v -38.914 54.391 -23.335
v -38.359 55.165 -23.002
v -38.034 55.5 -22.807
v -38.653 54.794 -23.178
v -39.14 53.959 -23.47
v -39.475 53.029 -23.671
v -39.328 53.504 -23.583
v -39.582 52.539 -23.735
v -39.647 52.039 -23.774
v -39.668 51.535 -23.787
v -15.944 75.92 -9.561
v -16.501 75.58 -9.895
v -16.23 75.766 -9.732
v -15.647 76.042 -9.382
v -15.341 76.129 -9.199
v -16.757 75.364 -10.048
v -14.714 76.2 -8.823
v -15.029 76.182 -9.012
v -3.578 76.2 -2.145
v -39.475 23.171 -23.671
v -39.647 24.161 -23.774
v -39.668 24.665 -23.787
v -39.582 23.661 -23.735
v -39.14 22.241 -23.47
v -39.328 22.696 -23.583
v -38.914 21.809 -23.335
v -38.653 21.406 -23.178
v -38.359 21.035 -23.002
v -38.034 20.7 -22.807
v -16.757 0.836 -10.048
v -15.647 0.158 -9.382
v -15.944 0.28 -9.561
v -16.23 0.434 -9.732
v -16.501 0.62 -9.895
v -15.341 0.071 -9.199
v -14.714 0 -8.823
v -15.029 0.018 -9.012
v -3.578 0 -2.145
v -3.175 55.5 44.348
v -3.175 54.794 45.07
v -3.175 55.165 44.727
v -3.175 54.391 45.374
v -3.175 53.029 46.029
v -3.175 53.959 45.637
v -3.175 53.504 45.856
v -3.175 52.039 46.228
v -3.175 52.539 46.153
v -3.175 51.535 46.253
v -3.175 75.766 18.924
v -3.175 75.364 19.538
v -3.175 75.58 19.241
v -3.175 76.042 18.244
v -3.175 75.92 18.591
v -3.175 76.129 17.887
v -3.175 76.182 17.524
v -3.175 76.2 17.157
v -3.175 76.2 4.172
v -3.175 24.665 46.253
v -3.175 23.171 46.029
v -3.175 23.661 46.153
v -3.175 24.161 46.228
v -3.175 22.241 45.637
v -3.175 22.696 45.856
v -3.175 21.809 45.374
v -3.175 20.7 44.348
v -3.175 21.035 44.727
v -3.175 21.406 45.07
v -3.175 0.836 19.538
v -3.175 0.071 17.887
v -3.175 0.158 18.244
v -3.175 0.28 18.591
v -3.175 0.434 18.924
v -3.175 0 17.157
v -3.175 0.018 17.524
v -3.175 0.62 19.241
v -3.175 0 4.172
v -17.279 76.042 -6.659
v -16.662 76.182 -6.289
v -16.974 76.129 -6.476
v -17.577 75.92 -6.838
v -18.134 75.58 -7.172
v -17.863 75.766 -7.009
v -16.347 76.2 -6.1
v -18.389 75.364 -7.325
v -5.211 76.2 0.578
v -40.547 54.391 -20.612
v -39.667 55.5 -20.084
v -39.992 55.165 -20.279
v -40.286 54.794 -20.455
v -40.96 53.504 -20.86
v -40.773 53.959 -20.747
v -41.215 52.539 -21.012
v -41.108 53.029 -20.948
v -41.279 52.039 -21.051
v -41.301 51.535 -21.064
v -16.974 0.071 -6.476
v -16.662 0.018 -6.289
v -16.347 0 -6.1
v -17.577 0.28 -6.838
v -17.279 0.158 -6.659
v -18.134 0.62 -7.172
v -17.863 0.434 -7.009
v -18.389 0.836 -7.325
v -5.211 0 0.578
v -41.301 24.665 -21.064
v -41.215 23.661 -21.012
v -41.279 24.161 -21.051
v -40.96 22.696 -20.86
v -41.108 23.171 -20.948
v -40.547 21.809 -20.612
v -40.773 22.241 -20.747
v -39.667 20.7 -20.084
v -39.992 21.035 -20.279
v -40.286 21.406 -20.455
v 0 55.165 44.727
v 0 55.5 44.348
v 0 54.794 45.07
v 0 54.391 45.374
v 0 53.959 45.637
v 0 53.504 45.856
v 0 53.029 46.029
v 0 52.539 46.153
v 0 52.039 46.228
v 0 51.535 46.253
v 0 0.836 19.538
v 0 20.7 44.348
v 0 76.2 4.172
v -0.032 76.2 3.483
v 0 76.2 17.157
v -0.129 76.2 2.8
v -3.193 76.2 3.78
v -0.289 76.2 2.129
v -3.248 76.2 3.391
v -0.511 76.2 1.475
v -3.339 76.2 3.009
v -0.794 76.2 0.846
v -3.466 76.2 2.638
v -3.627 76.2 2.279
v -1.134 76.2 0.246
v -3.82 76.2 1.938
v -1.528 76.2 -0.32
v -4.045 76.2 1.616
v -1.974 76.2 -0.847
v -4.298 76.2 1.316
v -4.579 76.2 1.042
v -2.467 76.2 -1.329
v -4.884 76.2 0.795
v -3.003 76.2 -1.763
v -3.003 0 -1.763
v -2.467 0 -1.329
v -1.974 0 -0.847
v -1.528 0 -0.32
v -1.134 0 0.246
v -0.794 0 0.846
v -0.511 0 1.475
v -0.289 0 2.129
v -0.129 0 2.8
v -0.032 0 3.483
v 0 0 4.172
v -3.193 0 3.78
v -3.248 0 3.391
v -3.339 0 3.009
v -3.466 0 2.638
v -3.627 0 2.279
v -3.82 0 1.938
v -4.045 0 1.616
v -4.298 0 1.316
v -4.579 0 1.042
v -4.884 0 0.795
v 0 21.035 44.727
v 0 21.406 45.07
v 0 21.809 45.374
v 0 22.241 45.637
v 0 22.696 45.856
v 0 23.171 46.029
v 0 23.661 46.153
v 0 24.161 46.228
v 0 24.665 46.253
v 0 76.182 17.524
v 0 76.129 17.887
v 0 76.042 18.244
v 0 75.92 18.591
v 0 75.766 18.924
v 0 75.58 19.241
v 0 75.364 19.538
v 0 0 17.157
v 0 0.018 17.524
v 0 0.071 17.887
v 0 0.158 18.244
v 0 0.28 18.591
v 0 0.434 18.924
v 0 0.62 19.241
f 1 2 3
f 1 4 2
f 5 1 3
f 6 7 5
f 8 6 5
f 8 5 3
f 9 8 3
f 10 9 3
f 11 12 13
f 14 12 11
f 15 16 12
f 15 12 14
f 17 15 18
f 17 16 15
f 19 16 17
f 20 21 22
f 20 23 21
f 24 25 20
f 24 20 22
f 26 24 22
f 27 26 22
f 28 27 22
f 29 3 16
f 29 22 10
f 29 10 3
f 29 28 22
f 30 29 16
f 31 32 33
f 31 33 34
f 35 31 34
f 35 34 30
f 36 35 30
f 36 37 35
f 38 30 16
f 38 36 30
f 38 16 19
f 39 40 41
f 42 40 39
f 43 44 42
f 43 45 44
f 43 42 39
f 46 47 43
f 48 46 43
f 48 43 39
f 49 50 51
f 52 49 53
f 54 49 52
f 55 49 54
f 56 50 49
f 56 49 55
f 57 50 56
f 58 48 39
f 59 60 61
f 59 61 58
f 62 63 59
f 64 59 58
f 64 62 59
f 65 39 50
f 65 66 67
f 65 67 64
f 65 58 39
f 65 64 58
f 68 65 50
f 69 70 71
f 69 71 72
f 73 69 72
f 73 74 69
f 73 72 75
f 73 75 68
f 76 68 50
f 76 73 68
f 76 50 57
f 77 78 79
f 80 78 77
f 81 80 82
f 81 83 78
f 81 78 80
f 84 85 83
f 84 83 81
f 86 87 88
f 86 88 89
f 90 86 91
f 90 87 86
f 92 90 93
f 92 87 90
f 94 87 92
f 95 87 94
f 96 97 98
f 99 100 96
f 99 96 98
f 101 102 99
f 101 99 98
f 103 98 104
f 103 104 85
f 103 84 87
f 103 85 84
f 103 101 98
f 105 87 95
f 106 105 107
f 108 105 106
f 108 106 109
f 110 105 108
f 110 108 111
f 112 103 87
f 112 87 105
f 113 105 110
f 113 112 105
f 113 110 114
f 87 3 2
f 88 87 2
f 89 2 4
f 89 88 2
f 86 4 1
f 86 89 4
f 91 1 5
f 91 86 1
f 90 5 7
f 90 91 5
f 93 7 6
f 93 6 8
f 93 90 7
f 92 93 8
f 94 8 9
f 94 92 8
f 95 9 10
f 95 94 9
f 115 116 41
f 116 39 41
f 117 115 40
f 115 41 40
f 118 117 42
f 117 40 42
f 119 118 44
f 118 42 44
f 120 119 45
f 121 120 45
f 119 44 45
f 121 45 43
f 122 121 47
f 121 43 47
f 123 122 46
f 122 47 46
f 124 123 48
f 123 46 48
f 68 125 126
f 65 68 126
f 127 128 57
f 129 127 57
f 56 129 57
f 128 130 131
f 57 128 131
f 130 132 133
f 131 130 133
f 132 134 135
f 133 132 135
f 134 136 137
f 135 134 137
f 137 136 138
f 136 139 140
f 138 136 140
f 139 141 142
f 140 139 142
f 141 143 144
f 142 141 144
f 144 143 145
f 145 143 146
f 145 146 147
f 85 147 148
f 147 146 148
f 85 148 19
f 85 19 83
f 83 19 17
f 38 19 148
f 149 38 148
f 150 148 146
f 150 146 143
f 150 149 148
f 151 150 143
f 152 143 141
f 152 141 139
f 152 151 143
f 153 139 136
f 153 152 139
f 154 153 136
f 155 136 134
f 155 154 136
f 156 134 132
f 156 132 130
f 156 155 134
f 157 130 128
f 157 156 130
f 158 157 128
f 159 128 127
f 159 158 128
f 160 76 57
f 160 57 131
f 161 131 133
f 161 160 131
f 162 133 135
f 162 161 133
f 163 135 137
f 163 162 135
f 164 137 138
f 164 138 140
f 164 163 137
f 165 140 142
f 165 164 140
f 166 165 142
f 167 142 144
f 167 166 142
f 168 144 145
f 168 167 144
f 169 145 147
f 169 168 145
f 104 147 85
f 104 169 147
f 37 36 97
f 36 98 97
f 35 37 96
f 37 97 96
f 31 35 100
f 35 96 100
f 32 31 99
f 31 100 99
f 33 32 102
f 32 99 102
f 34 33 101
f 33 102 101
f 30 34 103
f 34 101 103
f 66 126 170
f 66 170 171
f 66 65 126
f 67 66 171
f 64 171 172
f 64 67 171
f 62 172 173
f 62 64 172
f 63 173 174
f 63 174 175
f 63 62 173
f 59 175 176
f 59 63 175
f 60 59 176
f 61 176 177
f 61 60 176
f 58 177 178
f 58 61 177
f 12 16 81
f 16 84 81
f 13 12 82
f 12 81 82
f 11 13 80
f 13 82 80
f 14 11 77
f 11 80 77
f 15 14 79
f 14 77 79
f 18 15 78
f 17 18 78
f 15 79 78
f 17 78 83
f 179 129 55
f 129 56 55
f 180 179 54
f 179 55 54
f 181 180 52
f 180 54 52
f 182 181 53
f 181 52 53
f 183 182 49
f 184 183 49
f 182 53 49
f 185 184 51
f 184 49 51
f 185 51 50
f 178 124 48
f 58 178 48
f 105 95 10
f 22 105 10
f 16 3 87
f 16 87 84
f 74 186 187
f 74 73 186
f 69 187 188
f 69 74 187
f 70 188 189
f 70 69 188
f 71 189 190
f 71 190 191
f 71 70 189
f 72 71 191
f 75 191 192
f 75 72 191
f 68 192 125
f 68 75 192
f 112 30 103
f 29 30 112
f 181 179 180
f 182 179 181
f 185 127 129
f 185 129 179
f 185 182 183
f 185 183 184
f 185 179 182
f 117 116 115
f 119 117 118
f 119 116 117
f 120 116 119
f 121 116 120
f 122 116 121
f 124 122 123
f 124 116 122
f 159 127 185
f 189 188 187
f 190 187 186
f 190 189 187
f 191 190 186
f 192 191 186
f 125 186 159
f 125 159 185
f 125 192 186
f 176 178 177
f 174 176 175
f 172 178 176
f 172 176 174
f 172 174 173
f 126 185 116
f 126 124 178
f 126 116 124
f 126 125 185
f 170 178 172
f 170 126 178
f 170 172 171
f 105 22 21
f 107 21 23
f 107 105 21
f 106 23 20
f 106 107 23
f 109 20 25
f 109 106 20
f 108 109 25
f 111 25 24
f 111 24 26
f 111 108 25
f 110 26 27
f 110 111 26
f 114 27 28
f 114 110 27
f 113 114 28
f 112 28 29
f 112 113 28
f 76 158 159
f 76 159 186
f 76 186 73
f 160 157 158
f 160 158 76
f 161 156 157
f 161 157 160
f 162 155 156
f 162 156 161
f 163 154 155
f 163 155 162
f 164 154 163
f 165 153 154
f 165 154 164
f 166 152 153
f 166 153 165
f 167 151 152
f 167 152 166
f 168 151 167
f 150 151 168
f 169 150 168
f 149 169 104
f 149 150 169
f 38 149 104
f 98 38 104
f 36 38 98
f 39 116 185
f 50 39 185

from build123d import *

# Parameters (mm, degrees)
BOSS_EXTRUDE2_DEPTH = 76.2
CUT_EXTRUDE3_REACH  = 43.301
CUT_EXTRUDE4_REACH  = 62.908
FILLET1_R           = 5.08
FILLET2_R           = 3.81


with BuildPart() as part:
    # Sketch1 → Boss-Extrude2 (new body)
    with BuildSketch(Plane(origin=(0, 0, 0), x_dir=(1, 0, 0), z_dir=(0, 1, 0))):
        with BuildLine():
            Line((-39.668156778, 23.786852448), (-3.577868638, 2.145454699))
            ThreePointArc((-3.577868638, 2.145454699), (-0.956579917, -0.541770779), (0, -4.171824524))
            Line((0, -4.171824524), (0, -46.2534))
            Line((0, -46.2534), (-3.175, -46.2534))
            Line((-3.175, -46.2534), (-3.175, -4.171824524))
            ThreePointArc((-3.175, -4.171824524), (-3.719260987, -2.106449117), (-5.21068388, -0.577510483))
            Line((-5.21068388, -0.577510483), (-41.300972021, 21.063887265))
            Line((-41.300972021, 21.063887265), (-39.668156778, 23.786852448))
        make_face()
    extrude(amount=BOSS_EXTRUDE2_DEPTH)

    # Sketch2 → Cut-Extrude3 (cut, up to next)
    with BuildSketch(Plane(origin=(0, 0, 0), x_dir=(0, 0, -1), z_dir=(1, 0, 0)), mode=Mode.PRIVATE) as cut_extrude3_sk1:
        Polygon((-46.2534, 53.975), (-18.494383897, 76.2), (-46.2534, 76.2), align=None)
    cut_extrude3_tool1 = extrude(cut_extrude3_sk1.sketch, amount=-CUT_EXTRUDE3_REACH, mode=Mode.PRIVATE) & part.part
    add(cut_extrude3_tool1.solids().sort_by_distance((0, 68.791667, 37.000395))[0], mode=Mode.SUBTRACT)
    # Sketch2 → Cut-Extrude3 (cut, up to next)
    with BuildSketch(Plane(origin=(0, 0, 0), x_dir=(0, 0, -1), z_dir=(1, 0, 0)), mode=Mode.PRIVATE) as cut_extrude3_sk2:
        Polygon((-46.2534, 22.225), (-46.2534, 0), (-18.494383897, 0), align=None)
    cut_extrude3_tool2 = extrude(cut_extrude3_sk2.sketch, amount=-CUT_EXTRUDE3_REACH, mode=Mode.PRIVATE) & part.part
    add(cut_extrude3_tool2.solids().sort_by_distance((0, 7.408333, 37.000395))[0], mode=Mode.SUBTRACT)

    # Sketch4 → Cut-Extrude4 (cut, up to next)
    with BuildSketch(Plane(origin=(0, 0, 0), x_dir=(-0.857626829, 0, -0.514272517), z_dir=(0.514272517, 0, -0.857626829)), mode=Mode.PRIVATE) as cut_extrude4_sk1:
        Polygon((46.2534, 53.975), (18.494383897, 76.2), (46.2534, 76.2), align=None)
    cut_extrude4_tool1 = extrude(cut_extrude4_sk1.sketch, amount=-CUT_EXTRUDE4_REACH, mode=Mode.PRIVATE) & part.part
    add(cut_extrude4_tool1.solids().sort_by_distance((-31.732531, 68.791667, -19.028286))[0], mode=Mode.SUBTRACT)
    # Sketch4 → Cut-Extrude4 (cut, up to next)
    with BuildSketch(Plane(origin=(0, 0, 0), x_dir=(-0.857626829, 0, -0.514272517), z_dir=(0.514272517, 0, -0.857626829)), mode=Mode.PRIVATE) as cut_extrude4_sk2:
        Polygon((18.494383897, 0), (46.2534, 22.225), (46.2534, 0), align=None)
    cut_extrude4_tool2 = extrude(cut_extrude4_sk2.sketch, amount=-CUT_EXTRUDE4_REACH, mode=Mode.PRIVATE) & part.part
    add(cut_extrude4_tool2.solids().sort_by_distance((-31.732531, 7.408333, -19.028286))[0], mode=Mode.SUBTRACT)

    # Fillet1
    fillet1_edges = [part.edges().sort_by_distance(p)[0] for p in [
        (-1.5875, 22.225, 46.2534),
        (-1.5875, 53.975, 46.2534),
        (-40.4845644, 22.225, -22.425369856),
        (-40.4845644, 53.975, -22.425369856),
    ]]
    fillet(fillet1_edges, radius=FILLET1_R)

    # Fillet2
    fillet2_edges = [part.edges().sort_by_distance(p)[0] for p in [
        (-1.5875, 0, 18.494383897),
        (-1.5875, 76.2, 18.494383897),
        (-16.677687439, 0, -8.14967077),
        (-16.677687439, 76.2, -8.14967077),
    ]]
    fillet(fillet2_edges, radius=FILLET2_R)


solid = part.part
